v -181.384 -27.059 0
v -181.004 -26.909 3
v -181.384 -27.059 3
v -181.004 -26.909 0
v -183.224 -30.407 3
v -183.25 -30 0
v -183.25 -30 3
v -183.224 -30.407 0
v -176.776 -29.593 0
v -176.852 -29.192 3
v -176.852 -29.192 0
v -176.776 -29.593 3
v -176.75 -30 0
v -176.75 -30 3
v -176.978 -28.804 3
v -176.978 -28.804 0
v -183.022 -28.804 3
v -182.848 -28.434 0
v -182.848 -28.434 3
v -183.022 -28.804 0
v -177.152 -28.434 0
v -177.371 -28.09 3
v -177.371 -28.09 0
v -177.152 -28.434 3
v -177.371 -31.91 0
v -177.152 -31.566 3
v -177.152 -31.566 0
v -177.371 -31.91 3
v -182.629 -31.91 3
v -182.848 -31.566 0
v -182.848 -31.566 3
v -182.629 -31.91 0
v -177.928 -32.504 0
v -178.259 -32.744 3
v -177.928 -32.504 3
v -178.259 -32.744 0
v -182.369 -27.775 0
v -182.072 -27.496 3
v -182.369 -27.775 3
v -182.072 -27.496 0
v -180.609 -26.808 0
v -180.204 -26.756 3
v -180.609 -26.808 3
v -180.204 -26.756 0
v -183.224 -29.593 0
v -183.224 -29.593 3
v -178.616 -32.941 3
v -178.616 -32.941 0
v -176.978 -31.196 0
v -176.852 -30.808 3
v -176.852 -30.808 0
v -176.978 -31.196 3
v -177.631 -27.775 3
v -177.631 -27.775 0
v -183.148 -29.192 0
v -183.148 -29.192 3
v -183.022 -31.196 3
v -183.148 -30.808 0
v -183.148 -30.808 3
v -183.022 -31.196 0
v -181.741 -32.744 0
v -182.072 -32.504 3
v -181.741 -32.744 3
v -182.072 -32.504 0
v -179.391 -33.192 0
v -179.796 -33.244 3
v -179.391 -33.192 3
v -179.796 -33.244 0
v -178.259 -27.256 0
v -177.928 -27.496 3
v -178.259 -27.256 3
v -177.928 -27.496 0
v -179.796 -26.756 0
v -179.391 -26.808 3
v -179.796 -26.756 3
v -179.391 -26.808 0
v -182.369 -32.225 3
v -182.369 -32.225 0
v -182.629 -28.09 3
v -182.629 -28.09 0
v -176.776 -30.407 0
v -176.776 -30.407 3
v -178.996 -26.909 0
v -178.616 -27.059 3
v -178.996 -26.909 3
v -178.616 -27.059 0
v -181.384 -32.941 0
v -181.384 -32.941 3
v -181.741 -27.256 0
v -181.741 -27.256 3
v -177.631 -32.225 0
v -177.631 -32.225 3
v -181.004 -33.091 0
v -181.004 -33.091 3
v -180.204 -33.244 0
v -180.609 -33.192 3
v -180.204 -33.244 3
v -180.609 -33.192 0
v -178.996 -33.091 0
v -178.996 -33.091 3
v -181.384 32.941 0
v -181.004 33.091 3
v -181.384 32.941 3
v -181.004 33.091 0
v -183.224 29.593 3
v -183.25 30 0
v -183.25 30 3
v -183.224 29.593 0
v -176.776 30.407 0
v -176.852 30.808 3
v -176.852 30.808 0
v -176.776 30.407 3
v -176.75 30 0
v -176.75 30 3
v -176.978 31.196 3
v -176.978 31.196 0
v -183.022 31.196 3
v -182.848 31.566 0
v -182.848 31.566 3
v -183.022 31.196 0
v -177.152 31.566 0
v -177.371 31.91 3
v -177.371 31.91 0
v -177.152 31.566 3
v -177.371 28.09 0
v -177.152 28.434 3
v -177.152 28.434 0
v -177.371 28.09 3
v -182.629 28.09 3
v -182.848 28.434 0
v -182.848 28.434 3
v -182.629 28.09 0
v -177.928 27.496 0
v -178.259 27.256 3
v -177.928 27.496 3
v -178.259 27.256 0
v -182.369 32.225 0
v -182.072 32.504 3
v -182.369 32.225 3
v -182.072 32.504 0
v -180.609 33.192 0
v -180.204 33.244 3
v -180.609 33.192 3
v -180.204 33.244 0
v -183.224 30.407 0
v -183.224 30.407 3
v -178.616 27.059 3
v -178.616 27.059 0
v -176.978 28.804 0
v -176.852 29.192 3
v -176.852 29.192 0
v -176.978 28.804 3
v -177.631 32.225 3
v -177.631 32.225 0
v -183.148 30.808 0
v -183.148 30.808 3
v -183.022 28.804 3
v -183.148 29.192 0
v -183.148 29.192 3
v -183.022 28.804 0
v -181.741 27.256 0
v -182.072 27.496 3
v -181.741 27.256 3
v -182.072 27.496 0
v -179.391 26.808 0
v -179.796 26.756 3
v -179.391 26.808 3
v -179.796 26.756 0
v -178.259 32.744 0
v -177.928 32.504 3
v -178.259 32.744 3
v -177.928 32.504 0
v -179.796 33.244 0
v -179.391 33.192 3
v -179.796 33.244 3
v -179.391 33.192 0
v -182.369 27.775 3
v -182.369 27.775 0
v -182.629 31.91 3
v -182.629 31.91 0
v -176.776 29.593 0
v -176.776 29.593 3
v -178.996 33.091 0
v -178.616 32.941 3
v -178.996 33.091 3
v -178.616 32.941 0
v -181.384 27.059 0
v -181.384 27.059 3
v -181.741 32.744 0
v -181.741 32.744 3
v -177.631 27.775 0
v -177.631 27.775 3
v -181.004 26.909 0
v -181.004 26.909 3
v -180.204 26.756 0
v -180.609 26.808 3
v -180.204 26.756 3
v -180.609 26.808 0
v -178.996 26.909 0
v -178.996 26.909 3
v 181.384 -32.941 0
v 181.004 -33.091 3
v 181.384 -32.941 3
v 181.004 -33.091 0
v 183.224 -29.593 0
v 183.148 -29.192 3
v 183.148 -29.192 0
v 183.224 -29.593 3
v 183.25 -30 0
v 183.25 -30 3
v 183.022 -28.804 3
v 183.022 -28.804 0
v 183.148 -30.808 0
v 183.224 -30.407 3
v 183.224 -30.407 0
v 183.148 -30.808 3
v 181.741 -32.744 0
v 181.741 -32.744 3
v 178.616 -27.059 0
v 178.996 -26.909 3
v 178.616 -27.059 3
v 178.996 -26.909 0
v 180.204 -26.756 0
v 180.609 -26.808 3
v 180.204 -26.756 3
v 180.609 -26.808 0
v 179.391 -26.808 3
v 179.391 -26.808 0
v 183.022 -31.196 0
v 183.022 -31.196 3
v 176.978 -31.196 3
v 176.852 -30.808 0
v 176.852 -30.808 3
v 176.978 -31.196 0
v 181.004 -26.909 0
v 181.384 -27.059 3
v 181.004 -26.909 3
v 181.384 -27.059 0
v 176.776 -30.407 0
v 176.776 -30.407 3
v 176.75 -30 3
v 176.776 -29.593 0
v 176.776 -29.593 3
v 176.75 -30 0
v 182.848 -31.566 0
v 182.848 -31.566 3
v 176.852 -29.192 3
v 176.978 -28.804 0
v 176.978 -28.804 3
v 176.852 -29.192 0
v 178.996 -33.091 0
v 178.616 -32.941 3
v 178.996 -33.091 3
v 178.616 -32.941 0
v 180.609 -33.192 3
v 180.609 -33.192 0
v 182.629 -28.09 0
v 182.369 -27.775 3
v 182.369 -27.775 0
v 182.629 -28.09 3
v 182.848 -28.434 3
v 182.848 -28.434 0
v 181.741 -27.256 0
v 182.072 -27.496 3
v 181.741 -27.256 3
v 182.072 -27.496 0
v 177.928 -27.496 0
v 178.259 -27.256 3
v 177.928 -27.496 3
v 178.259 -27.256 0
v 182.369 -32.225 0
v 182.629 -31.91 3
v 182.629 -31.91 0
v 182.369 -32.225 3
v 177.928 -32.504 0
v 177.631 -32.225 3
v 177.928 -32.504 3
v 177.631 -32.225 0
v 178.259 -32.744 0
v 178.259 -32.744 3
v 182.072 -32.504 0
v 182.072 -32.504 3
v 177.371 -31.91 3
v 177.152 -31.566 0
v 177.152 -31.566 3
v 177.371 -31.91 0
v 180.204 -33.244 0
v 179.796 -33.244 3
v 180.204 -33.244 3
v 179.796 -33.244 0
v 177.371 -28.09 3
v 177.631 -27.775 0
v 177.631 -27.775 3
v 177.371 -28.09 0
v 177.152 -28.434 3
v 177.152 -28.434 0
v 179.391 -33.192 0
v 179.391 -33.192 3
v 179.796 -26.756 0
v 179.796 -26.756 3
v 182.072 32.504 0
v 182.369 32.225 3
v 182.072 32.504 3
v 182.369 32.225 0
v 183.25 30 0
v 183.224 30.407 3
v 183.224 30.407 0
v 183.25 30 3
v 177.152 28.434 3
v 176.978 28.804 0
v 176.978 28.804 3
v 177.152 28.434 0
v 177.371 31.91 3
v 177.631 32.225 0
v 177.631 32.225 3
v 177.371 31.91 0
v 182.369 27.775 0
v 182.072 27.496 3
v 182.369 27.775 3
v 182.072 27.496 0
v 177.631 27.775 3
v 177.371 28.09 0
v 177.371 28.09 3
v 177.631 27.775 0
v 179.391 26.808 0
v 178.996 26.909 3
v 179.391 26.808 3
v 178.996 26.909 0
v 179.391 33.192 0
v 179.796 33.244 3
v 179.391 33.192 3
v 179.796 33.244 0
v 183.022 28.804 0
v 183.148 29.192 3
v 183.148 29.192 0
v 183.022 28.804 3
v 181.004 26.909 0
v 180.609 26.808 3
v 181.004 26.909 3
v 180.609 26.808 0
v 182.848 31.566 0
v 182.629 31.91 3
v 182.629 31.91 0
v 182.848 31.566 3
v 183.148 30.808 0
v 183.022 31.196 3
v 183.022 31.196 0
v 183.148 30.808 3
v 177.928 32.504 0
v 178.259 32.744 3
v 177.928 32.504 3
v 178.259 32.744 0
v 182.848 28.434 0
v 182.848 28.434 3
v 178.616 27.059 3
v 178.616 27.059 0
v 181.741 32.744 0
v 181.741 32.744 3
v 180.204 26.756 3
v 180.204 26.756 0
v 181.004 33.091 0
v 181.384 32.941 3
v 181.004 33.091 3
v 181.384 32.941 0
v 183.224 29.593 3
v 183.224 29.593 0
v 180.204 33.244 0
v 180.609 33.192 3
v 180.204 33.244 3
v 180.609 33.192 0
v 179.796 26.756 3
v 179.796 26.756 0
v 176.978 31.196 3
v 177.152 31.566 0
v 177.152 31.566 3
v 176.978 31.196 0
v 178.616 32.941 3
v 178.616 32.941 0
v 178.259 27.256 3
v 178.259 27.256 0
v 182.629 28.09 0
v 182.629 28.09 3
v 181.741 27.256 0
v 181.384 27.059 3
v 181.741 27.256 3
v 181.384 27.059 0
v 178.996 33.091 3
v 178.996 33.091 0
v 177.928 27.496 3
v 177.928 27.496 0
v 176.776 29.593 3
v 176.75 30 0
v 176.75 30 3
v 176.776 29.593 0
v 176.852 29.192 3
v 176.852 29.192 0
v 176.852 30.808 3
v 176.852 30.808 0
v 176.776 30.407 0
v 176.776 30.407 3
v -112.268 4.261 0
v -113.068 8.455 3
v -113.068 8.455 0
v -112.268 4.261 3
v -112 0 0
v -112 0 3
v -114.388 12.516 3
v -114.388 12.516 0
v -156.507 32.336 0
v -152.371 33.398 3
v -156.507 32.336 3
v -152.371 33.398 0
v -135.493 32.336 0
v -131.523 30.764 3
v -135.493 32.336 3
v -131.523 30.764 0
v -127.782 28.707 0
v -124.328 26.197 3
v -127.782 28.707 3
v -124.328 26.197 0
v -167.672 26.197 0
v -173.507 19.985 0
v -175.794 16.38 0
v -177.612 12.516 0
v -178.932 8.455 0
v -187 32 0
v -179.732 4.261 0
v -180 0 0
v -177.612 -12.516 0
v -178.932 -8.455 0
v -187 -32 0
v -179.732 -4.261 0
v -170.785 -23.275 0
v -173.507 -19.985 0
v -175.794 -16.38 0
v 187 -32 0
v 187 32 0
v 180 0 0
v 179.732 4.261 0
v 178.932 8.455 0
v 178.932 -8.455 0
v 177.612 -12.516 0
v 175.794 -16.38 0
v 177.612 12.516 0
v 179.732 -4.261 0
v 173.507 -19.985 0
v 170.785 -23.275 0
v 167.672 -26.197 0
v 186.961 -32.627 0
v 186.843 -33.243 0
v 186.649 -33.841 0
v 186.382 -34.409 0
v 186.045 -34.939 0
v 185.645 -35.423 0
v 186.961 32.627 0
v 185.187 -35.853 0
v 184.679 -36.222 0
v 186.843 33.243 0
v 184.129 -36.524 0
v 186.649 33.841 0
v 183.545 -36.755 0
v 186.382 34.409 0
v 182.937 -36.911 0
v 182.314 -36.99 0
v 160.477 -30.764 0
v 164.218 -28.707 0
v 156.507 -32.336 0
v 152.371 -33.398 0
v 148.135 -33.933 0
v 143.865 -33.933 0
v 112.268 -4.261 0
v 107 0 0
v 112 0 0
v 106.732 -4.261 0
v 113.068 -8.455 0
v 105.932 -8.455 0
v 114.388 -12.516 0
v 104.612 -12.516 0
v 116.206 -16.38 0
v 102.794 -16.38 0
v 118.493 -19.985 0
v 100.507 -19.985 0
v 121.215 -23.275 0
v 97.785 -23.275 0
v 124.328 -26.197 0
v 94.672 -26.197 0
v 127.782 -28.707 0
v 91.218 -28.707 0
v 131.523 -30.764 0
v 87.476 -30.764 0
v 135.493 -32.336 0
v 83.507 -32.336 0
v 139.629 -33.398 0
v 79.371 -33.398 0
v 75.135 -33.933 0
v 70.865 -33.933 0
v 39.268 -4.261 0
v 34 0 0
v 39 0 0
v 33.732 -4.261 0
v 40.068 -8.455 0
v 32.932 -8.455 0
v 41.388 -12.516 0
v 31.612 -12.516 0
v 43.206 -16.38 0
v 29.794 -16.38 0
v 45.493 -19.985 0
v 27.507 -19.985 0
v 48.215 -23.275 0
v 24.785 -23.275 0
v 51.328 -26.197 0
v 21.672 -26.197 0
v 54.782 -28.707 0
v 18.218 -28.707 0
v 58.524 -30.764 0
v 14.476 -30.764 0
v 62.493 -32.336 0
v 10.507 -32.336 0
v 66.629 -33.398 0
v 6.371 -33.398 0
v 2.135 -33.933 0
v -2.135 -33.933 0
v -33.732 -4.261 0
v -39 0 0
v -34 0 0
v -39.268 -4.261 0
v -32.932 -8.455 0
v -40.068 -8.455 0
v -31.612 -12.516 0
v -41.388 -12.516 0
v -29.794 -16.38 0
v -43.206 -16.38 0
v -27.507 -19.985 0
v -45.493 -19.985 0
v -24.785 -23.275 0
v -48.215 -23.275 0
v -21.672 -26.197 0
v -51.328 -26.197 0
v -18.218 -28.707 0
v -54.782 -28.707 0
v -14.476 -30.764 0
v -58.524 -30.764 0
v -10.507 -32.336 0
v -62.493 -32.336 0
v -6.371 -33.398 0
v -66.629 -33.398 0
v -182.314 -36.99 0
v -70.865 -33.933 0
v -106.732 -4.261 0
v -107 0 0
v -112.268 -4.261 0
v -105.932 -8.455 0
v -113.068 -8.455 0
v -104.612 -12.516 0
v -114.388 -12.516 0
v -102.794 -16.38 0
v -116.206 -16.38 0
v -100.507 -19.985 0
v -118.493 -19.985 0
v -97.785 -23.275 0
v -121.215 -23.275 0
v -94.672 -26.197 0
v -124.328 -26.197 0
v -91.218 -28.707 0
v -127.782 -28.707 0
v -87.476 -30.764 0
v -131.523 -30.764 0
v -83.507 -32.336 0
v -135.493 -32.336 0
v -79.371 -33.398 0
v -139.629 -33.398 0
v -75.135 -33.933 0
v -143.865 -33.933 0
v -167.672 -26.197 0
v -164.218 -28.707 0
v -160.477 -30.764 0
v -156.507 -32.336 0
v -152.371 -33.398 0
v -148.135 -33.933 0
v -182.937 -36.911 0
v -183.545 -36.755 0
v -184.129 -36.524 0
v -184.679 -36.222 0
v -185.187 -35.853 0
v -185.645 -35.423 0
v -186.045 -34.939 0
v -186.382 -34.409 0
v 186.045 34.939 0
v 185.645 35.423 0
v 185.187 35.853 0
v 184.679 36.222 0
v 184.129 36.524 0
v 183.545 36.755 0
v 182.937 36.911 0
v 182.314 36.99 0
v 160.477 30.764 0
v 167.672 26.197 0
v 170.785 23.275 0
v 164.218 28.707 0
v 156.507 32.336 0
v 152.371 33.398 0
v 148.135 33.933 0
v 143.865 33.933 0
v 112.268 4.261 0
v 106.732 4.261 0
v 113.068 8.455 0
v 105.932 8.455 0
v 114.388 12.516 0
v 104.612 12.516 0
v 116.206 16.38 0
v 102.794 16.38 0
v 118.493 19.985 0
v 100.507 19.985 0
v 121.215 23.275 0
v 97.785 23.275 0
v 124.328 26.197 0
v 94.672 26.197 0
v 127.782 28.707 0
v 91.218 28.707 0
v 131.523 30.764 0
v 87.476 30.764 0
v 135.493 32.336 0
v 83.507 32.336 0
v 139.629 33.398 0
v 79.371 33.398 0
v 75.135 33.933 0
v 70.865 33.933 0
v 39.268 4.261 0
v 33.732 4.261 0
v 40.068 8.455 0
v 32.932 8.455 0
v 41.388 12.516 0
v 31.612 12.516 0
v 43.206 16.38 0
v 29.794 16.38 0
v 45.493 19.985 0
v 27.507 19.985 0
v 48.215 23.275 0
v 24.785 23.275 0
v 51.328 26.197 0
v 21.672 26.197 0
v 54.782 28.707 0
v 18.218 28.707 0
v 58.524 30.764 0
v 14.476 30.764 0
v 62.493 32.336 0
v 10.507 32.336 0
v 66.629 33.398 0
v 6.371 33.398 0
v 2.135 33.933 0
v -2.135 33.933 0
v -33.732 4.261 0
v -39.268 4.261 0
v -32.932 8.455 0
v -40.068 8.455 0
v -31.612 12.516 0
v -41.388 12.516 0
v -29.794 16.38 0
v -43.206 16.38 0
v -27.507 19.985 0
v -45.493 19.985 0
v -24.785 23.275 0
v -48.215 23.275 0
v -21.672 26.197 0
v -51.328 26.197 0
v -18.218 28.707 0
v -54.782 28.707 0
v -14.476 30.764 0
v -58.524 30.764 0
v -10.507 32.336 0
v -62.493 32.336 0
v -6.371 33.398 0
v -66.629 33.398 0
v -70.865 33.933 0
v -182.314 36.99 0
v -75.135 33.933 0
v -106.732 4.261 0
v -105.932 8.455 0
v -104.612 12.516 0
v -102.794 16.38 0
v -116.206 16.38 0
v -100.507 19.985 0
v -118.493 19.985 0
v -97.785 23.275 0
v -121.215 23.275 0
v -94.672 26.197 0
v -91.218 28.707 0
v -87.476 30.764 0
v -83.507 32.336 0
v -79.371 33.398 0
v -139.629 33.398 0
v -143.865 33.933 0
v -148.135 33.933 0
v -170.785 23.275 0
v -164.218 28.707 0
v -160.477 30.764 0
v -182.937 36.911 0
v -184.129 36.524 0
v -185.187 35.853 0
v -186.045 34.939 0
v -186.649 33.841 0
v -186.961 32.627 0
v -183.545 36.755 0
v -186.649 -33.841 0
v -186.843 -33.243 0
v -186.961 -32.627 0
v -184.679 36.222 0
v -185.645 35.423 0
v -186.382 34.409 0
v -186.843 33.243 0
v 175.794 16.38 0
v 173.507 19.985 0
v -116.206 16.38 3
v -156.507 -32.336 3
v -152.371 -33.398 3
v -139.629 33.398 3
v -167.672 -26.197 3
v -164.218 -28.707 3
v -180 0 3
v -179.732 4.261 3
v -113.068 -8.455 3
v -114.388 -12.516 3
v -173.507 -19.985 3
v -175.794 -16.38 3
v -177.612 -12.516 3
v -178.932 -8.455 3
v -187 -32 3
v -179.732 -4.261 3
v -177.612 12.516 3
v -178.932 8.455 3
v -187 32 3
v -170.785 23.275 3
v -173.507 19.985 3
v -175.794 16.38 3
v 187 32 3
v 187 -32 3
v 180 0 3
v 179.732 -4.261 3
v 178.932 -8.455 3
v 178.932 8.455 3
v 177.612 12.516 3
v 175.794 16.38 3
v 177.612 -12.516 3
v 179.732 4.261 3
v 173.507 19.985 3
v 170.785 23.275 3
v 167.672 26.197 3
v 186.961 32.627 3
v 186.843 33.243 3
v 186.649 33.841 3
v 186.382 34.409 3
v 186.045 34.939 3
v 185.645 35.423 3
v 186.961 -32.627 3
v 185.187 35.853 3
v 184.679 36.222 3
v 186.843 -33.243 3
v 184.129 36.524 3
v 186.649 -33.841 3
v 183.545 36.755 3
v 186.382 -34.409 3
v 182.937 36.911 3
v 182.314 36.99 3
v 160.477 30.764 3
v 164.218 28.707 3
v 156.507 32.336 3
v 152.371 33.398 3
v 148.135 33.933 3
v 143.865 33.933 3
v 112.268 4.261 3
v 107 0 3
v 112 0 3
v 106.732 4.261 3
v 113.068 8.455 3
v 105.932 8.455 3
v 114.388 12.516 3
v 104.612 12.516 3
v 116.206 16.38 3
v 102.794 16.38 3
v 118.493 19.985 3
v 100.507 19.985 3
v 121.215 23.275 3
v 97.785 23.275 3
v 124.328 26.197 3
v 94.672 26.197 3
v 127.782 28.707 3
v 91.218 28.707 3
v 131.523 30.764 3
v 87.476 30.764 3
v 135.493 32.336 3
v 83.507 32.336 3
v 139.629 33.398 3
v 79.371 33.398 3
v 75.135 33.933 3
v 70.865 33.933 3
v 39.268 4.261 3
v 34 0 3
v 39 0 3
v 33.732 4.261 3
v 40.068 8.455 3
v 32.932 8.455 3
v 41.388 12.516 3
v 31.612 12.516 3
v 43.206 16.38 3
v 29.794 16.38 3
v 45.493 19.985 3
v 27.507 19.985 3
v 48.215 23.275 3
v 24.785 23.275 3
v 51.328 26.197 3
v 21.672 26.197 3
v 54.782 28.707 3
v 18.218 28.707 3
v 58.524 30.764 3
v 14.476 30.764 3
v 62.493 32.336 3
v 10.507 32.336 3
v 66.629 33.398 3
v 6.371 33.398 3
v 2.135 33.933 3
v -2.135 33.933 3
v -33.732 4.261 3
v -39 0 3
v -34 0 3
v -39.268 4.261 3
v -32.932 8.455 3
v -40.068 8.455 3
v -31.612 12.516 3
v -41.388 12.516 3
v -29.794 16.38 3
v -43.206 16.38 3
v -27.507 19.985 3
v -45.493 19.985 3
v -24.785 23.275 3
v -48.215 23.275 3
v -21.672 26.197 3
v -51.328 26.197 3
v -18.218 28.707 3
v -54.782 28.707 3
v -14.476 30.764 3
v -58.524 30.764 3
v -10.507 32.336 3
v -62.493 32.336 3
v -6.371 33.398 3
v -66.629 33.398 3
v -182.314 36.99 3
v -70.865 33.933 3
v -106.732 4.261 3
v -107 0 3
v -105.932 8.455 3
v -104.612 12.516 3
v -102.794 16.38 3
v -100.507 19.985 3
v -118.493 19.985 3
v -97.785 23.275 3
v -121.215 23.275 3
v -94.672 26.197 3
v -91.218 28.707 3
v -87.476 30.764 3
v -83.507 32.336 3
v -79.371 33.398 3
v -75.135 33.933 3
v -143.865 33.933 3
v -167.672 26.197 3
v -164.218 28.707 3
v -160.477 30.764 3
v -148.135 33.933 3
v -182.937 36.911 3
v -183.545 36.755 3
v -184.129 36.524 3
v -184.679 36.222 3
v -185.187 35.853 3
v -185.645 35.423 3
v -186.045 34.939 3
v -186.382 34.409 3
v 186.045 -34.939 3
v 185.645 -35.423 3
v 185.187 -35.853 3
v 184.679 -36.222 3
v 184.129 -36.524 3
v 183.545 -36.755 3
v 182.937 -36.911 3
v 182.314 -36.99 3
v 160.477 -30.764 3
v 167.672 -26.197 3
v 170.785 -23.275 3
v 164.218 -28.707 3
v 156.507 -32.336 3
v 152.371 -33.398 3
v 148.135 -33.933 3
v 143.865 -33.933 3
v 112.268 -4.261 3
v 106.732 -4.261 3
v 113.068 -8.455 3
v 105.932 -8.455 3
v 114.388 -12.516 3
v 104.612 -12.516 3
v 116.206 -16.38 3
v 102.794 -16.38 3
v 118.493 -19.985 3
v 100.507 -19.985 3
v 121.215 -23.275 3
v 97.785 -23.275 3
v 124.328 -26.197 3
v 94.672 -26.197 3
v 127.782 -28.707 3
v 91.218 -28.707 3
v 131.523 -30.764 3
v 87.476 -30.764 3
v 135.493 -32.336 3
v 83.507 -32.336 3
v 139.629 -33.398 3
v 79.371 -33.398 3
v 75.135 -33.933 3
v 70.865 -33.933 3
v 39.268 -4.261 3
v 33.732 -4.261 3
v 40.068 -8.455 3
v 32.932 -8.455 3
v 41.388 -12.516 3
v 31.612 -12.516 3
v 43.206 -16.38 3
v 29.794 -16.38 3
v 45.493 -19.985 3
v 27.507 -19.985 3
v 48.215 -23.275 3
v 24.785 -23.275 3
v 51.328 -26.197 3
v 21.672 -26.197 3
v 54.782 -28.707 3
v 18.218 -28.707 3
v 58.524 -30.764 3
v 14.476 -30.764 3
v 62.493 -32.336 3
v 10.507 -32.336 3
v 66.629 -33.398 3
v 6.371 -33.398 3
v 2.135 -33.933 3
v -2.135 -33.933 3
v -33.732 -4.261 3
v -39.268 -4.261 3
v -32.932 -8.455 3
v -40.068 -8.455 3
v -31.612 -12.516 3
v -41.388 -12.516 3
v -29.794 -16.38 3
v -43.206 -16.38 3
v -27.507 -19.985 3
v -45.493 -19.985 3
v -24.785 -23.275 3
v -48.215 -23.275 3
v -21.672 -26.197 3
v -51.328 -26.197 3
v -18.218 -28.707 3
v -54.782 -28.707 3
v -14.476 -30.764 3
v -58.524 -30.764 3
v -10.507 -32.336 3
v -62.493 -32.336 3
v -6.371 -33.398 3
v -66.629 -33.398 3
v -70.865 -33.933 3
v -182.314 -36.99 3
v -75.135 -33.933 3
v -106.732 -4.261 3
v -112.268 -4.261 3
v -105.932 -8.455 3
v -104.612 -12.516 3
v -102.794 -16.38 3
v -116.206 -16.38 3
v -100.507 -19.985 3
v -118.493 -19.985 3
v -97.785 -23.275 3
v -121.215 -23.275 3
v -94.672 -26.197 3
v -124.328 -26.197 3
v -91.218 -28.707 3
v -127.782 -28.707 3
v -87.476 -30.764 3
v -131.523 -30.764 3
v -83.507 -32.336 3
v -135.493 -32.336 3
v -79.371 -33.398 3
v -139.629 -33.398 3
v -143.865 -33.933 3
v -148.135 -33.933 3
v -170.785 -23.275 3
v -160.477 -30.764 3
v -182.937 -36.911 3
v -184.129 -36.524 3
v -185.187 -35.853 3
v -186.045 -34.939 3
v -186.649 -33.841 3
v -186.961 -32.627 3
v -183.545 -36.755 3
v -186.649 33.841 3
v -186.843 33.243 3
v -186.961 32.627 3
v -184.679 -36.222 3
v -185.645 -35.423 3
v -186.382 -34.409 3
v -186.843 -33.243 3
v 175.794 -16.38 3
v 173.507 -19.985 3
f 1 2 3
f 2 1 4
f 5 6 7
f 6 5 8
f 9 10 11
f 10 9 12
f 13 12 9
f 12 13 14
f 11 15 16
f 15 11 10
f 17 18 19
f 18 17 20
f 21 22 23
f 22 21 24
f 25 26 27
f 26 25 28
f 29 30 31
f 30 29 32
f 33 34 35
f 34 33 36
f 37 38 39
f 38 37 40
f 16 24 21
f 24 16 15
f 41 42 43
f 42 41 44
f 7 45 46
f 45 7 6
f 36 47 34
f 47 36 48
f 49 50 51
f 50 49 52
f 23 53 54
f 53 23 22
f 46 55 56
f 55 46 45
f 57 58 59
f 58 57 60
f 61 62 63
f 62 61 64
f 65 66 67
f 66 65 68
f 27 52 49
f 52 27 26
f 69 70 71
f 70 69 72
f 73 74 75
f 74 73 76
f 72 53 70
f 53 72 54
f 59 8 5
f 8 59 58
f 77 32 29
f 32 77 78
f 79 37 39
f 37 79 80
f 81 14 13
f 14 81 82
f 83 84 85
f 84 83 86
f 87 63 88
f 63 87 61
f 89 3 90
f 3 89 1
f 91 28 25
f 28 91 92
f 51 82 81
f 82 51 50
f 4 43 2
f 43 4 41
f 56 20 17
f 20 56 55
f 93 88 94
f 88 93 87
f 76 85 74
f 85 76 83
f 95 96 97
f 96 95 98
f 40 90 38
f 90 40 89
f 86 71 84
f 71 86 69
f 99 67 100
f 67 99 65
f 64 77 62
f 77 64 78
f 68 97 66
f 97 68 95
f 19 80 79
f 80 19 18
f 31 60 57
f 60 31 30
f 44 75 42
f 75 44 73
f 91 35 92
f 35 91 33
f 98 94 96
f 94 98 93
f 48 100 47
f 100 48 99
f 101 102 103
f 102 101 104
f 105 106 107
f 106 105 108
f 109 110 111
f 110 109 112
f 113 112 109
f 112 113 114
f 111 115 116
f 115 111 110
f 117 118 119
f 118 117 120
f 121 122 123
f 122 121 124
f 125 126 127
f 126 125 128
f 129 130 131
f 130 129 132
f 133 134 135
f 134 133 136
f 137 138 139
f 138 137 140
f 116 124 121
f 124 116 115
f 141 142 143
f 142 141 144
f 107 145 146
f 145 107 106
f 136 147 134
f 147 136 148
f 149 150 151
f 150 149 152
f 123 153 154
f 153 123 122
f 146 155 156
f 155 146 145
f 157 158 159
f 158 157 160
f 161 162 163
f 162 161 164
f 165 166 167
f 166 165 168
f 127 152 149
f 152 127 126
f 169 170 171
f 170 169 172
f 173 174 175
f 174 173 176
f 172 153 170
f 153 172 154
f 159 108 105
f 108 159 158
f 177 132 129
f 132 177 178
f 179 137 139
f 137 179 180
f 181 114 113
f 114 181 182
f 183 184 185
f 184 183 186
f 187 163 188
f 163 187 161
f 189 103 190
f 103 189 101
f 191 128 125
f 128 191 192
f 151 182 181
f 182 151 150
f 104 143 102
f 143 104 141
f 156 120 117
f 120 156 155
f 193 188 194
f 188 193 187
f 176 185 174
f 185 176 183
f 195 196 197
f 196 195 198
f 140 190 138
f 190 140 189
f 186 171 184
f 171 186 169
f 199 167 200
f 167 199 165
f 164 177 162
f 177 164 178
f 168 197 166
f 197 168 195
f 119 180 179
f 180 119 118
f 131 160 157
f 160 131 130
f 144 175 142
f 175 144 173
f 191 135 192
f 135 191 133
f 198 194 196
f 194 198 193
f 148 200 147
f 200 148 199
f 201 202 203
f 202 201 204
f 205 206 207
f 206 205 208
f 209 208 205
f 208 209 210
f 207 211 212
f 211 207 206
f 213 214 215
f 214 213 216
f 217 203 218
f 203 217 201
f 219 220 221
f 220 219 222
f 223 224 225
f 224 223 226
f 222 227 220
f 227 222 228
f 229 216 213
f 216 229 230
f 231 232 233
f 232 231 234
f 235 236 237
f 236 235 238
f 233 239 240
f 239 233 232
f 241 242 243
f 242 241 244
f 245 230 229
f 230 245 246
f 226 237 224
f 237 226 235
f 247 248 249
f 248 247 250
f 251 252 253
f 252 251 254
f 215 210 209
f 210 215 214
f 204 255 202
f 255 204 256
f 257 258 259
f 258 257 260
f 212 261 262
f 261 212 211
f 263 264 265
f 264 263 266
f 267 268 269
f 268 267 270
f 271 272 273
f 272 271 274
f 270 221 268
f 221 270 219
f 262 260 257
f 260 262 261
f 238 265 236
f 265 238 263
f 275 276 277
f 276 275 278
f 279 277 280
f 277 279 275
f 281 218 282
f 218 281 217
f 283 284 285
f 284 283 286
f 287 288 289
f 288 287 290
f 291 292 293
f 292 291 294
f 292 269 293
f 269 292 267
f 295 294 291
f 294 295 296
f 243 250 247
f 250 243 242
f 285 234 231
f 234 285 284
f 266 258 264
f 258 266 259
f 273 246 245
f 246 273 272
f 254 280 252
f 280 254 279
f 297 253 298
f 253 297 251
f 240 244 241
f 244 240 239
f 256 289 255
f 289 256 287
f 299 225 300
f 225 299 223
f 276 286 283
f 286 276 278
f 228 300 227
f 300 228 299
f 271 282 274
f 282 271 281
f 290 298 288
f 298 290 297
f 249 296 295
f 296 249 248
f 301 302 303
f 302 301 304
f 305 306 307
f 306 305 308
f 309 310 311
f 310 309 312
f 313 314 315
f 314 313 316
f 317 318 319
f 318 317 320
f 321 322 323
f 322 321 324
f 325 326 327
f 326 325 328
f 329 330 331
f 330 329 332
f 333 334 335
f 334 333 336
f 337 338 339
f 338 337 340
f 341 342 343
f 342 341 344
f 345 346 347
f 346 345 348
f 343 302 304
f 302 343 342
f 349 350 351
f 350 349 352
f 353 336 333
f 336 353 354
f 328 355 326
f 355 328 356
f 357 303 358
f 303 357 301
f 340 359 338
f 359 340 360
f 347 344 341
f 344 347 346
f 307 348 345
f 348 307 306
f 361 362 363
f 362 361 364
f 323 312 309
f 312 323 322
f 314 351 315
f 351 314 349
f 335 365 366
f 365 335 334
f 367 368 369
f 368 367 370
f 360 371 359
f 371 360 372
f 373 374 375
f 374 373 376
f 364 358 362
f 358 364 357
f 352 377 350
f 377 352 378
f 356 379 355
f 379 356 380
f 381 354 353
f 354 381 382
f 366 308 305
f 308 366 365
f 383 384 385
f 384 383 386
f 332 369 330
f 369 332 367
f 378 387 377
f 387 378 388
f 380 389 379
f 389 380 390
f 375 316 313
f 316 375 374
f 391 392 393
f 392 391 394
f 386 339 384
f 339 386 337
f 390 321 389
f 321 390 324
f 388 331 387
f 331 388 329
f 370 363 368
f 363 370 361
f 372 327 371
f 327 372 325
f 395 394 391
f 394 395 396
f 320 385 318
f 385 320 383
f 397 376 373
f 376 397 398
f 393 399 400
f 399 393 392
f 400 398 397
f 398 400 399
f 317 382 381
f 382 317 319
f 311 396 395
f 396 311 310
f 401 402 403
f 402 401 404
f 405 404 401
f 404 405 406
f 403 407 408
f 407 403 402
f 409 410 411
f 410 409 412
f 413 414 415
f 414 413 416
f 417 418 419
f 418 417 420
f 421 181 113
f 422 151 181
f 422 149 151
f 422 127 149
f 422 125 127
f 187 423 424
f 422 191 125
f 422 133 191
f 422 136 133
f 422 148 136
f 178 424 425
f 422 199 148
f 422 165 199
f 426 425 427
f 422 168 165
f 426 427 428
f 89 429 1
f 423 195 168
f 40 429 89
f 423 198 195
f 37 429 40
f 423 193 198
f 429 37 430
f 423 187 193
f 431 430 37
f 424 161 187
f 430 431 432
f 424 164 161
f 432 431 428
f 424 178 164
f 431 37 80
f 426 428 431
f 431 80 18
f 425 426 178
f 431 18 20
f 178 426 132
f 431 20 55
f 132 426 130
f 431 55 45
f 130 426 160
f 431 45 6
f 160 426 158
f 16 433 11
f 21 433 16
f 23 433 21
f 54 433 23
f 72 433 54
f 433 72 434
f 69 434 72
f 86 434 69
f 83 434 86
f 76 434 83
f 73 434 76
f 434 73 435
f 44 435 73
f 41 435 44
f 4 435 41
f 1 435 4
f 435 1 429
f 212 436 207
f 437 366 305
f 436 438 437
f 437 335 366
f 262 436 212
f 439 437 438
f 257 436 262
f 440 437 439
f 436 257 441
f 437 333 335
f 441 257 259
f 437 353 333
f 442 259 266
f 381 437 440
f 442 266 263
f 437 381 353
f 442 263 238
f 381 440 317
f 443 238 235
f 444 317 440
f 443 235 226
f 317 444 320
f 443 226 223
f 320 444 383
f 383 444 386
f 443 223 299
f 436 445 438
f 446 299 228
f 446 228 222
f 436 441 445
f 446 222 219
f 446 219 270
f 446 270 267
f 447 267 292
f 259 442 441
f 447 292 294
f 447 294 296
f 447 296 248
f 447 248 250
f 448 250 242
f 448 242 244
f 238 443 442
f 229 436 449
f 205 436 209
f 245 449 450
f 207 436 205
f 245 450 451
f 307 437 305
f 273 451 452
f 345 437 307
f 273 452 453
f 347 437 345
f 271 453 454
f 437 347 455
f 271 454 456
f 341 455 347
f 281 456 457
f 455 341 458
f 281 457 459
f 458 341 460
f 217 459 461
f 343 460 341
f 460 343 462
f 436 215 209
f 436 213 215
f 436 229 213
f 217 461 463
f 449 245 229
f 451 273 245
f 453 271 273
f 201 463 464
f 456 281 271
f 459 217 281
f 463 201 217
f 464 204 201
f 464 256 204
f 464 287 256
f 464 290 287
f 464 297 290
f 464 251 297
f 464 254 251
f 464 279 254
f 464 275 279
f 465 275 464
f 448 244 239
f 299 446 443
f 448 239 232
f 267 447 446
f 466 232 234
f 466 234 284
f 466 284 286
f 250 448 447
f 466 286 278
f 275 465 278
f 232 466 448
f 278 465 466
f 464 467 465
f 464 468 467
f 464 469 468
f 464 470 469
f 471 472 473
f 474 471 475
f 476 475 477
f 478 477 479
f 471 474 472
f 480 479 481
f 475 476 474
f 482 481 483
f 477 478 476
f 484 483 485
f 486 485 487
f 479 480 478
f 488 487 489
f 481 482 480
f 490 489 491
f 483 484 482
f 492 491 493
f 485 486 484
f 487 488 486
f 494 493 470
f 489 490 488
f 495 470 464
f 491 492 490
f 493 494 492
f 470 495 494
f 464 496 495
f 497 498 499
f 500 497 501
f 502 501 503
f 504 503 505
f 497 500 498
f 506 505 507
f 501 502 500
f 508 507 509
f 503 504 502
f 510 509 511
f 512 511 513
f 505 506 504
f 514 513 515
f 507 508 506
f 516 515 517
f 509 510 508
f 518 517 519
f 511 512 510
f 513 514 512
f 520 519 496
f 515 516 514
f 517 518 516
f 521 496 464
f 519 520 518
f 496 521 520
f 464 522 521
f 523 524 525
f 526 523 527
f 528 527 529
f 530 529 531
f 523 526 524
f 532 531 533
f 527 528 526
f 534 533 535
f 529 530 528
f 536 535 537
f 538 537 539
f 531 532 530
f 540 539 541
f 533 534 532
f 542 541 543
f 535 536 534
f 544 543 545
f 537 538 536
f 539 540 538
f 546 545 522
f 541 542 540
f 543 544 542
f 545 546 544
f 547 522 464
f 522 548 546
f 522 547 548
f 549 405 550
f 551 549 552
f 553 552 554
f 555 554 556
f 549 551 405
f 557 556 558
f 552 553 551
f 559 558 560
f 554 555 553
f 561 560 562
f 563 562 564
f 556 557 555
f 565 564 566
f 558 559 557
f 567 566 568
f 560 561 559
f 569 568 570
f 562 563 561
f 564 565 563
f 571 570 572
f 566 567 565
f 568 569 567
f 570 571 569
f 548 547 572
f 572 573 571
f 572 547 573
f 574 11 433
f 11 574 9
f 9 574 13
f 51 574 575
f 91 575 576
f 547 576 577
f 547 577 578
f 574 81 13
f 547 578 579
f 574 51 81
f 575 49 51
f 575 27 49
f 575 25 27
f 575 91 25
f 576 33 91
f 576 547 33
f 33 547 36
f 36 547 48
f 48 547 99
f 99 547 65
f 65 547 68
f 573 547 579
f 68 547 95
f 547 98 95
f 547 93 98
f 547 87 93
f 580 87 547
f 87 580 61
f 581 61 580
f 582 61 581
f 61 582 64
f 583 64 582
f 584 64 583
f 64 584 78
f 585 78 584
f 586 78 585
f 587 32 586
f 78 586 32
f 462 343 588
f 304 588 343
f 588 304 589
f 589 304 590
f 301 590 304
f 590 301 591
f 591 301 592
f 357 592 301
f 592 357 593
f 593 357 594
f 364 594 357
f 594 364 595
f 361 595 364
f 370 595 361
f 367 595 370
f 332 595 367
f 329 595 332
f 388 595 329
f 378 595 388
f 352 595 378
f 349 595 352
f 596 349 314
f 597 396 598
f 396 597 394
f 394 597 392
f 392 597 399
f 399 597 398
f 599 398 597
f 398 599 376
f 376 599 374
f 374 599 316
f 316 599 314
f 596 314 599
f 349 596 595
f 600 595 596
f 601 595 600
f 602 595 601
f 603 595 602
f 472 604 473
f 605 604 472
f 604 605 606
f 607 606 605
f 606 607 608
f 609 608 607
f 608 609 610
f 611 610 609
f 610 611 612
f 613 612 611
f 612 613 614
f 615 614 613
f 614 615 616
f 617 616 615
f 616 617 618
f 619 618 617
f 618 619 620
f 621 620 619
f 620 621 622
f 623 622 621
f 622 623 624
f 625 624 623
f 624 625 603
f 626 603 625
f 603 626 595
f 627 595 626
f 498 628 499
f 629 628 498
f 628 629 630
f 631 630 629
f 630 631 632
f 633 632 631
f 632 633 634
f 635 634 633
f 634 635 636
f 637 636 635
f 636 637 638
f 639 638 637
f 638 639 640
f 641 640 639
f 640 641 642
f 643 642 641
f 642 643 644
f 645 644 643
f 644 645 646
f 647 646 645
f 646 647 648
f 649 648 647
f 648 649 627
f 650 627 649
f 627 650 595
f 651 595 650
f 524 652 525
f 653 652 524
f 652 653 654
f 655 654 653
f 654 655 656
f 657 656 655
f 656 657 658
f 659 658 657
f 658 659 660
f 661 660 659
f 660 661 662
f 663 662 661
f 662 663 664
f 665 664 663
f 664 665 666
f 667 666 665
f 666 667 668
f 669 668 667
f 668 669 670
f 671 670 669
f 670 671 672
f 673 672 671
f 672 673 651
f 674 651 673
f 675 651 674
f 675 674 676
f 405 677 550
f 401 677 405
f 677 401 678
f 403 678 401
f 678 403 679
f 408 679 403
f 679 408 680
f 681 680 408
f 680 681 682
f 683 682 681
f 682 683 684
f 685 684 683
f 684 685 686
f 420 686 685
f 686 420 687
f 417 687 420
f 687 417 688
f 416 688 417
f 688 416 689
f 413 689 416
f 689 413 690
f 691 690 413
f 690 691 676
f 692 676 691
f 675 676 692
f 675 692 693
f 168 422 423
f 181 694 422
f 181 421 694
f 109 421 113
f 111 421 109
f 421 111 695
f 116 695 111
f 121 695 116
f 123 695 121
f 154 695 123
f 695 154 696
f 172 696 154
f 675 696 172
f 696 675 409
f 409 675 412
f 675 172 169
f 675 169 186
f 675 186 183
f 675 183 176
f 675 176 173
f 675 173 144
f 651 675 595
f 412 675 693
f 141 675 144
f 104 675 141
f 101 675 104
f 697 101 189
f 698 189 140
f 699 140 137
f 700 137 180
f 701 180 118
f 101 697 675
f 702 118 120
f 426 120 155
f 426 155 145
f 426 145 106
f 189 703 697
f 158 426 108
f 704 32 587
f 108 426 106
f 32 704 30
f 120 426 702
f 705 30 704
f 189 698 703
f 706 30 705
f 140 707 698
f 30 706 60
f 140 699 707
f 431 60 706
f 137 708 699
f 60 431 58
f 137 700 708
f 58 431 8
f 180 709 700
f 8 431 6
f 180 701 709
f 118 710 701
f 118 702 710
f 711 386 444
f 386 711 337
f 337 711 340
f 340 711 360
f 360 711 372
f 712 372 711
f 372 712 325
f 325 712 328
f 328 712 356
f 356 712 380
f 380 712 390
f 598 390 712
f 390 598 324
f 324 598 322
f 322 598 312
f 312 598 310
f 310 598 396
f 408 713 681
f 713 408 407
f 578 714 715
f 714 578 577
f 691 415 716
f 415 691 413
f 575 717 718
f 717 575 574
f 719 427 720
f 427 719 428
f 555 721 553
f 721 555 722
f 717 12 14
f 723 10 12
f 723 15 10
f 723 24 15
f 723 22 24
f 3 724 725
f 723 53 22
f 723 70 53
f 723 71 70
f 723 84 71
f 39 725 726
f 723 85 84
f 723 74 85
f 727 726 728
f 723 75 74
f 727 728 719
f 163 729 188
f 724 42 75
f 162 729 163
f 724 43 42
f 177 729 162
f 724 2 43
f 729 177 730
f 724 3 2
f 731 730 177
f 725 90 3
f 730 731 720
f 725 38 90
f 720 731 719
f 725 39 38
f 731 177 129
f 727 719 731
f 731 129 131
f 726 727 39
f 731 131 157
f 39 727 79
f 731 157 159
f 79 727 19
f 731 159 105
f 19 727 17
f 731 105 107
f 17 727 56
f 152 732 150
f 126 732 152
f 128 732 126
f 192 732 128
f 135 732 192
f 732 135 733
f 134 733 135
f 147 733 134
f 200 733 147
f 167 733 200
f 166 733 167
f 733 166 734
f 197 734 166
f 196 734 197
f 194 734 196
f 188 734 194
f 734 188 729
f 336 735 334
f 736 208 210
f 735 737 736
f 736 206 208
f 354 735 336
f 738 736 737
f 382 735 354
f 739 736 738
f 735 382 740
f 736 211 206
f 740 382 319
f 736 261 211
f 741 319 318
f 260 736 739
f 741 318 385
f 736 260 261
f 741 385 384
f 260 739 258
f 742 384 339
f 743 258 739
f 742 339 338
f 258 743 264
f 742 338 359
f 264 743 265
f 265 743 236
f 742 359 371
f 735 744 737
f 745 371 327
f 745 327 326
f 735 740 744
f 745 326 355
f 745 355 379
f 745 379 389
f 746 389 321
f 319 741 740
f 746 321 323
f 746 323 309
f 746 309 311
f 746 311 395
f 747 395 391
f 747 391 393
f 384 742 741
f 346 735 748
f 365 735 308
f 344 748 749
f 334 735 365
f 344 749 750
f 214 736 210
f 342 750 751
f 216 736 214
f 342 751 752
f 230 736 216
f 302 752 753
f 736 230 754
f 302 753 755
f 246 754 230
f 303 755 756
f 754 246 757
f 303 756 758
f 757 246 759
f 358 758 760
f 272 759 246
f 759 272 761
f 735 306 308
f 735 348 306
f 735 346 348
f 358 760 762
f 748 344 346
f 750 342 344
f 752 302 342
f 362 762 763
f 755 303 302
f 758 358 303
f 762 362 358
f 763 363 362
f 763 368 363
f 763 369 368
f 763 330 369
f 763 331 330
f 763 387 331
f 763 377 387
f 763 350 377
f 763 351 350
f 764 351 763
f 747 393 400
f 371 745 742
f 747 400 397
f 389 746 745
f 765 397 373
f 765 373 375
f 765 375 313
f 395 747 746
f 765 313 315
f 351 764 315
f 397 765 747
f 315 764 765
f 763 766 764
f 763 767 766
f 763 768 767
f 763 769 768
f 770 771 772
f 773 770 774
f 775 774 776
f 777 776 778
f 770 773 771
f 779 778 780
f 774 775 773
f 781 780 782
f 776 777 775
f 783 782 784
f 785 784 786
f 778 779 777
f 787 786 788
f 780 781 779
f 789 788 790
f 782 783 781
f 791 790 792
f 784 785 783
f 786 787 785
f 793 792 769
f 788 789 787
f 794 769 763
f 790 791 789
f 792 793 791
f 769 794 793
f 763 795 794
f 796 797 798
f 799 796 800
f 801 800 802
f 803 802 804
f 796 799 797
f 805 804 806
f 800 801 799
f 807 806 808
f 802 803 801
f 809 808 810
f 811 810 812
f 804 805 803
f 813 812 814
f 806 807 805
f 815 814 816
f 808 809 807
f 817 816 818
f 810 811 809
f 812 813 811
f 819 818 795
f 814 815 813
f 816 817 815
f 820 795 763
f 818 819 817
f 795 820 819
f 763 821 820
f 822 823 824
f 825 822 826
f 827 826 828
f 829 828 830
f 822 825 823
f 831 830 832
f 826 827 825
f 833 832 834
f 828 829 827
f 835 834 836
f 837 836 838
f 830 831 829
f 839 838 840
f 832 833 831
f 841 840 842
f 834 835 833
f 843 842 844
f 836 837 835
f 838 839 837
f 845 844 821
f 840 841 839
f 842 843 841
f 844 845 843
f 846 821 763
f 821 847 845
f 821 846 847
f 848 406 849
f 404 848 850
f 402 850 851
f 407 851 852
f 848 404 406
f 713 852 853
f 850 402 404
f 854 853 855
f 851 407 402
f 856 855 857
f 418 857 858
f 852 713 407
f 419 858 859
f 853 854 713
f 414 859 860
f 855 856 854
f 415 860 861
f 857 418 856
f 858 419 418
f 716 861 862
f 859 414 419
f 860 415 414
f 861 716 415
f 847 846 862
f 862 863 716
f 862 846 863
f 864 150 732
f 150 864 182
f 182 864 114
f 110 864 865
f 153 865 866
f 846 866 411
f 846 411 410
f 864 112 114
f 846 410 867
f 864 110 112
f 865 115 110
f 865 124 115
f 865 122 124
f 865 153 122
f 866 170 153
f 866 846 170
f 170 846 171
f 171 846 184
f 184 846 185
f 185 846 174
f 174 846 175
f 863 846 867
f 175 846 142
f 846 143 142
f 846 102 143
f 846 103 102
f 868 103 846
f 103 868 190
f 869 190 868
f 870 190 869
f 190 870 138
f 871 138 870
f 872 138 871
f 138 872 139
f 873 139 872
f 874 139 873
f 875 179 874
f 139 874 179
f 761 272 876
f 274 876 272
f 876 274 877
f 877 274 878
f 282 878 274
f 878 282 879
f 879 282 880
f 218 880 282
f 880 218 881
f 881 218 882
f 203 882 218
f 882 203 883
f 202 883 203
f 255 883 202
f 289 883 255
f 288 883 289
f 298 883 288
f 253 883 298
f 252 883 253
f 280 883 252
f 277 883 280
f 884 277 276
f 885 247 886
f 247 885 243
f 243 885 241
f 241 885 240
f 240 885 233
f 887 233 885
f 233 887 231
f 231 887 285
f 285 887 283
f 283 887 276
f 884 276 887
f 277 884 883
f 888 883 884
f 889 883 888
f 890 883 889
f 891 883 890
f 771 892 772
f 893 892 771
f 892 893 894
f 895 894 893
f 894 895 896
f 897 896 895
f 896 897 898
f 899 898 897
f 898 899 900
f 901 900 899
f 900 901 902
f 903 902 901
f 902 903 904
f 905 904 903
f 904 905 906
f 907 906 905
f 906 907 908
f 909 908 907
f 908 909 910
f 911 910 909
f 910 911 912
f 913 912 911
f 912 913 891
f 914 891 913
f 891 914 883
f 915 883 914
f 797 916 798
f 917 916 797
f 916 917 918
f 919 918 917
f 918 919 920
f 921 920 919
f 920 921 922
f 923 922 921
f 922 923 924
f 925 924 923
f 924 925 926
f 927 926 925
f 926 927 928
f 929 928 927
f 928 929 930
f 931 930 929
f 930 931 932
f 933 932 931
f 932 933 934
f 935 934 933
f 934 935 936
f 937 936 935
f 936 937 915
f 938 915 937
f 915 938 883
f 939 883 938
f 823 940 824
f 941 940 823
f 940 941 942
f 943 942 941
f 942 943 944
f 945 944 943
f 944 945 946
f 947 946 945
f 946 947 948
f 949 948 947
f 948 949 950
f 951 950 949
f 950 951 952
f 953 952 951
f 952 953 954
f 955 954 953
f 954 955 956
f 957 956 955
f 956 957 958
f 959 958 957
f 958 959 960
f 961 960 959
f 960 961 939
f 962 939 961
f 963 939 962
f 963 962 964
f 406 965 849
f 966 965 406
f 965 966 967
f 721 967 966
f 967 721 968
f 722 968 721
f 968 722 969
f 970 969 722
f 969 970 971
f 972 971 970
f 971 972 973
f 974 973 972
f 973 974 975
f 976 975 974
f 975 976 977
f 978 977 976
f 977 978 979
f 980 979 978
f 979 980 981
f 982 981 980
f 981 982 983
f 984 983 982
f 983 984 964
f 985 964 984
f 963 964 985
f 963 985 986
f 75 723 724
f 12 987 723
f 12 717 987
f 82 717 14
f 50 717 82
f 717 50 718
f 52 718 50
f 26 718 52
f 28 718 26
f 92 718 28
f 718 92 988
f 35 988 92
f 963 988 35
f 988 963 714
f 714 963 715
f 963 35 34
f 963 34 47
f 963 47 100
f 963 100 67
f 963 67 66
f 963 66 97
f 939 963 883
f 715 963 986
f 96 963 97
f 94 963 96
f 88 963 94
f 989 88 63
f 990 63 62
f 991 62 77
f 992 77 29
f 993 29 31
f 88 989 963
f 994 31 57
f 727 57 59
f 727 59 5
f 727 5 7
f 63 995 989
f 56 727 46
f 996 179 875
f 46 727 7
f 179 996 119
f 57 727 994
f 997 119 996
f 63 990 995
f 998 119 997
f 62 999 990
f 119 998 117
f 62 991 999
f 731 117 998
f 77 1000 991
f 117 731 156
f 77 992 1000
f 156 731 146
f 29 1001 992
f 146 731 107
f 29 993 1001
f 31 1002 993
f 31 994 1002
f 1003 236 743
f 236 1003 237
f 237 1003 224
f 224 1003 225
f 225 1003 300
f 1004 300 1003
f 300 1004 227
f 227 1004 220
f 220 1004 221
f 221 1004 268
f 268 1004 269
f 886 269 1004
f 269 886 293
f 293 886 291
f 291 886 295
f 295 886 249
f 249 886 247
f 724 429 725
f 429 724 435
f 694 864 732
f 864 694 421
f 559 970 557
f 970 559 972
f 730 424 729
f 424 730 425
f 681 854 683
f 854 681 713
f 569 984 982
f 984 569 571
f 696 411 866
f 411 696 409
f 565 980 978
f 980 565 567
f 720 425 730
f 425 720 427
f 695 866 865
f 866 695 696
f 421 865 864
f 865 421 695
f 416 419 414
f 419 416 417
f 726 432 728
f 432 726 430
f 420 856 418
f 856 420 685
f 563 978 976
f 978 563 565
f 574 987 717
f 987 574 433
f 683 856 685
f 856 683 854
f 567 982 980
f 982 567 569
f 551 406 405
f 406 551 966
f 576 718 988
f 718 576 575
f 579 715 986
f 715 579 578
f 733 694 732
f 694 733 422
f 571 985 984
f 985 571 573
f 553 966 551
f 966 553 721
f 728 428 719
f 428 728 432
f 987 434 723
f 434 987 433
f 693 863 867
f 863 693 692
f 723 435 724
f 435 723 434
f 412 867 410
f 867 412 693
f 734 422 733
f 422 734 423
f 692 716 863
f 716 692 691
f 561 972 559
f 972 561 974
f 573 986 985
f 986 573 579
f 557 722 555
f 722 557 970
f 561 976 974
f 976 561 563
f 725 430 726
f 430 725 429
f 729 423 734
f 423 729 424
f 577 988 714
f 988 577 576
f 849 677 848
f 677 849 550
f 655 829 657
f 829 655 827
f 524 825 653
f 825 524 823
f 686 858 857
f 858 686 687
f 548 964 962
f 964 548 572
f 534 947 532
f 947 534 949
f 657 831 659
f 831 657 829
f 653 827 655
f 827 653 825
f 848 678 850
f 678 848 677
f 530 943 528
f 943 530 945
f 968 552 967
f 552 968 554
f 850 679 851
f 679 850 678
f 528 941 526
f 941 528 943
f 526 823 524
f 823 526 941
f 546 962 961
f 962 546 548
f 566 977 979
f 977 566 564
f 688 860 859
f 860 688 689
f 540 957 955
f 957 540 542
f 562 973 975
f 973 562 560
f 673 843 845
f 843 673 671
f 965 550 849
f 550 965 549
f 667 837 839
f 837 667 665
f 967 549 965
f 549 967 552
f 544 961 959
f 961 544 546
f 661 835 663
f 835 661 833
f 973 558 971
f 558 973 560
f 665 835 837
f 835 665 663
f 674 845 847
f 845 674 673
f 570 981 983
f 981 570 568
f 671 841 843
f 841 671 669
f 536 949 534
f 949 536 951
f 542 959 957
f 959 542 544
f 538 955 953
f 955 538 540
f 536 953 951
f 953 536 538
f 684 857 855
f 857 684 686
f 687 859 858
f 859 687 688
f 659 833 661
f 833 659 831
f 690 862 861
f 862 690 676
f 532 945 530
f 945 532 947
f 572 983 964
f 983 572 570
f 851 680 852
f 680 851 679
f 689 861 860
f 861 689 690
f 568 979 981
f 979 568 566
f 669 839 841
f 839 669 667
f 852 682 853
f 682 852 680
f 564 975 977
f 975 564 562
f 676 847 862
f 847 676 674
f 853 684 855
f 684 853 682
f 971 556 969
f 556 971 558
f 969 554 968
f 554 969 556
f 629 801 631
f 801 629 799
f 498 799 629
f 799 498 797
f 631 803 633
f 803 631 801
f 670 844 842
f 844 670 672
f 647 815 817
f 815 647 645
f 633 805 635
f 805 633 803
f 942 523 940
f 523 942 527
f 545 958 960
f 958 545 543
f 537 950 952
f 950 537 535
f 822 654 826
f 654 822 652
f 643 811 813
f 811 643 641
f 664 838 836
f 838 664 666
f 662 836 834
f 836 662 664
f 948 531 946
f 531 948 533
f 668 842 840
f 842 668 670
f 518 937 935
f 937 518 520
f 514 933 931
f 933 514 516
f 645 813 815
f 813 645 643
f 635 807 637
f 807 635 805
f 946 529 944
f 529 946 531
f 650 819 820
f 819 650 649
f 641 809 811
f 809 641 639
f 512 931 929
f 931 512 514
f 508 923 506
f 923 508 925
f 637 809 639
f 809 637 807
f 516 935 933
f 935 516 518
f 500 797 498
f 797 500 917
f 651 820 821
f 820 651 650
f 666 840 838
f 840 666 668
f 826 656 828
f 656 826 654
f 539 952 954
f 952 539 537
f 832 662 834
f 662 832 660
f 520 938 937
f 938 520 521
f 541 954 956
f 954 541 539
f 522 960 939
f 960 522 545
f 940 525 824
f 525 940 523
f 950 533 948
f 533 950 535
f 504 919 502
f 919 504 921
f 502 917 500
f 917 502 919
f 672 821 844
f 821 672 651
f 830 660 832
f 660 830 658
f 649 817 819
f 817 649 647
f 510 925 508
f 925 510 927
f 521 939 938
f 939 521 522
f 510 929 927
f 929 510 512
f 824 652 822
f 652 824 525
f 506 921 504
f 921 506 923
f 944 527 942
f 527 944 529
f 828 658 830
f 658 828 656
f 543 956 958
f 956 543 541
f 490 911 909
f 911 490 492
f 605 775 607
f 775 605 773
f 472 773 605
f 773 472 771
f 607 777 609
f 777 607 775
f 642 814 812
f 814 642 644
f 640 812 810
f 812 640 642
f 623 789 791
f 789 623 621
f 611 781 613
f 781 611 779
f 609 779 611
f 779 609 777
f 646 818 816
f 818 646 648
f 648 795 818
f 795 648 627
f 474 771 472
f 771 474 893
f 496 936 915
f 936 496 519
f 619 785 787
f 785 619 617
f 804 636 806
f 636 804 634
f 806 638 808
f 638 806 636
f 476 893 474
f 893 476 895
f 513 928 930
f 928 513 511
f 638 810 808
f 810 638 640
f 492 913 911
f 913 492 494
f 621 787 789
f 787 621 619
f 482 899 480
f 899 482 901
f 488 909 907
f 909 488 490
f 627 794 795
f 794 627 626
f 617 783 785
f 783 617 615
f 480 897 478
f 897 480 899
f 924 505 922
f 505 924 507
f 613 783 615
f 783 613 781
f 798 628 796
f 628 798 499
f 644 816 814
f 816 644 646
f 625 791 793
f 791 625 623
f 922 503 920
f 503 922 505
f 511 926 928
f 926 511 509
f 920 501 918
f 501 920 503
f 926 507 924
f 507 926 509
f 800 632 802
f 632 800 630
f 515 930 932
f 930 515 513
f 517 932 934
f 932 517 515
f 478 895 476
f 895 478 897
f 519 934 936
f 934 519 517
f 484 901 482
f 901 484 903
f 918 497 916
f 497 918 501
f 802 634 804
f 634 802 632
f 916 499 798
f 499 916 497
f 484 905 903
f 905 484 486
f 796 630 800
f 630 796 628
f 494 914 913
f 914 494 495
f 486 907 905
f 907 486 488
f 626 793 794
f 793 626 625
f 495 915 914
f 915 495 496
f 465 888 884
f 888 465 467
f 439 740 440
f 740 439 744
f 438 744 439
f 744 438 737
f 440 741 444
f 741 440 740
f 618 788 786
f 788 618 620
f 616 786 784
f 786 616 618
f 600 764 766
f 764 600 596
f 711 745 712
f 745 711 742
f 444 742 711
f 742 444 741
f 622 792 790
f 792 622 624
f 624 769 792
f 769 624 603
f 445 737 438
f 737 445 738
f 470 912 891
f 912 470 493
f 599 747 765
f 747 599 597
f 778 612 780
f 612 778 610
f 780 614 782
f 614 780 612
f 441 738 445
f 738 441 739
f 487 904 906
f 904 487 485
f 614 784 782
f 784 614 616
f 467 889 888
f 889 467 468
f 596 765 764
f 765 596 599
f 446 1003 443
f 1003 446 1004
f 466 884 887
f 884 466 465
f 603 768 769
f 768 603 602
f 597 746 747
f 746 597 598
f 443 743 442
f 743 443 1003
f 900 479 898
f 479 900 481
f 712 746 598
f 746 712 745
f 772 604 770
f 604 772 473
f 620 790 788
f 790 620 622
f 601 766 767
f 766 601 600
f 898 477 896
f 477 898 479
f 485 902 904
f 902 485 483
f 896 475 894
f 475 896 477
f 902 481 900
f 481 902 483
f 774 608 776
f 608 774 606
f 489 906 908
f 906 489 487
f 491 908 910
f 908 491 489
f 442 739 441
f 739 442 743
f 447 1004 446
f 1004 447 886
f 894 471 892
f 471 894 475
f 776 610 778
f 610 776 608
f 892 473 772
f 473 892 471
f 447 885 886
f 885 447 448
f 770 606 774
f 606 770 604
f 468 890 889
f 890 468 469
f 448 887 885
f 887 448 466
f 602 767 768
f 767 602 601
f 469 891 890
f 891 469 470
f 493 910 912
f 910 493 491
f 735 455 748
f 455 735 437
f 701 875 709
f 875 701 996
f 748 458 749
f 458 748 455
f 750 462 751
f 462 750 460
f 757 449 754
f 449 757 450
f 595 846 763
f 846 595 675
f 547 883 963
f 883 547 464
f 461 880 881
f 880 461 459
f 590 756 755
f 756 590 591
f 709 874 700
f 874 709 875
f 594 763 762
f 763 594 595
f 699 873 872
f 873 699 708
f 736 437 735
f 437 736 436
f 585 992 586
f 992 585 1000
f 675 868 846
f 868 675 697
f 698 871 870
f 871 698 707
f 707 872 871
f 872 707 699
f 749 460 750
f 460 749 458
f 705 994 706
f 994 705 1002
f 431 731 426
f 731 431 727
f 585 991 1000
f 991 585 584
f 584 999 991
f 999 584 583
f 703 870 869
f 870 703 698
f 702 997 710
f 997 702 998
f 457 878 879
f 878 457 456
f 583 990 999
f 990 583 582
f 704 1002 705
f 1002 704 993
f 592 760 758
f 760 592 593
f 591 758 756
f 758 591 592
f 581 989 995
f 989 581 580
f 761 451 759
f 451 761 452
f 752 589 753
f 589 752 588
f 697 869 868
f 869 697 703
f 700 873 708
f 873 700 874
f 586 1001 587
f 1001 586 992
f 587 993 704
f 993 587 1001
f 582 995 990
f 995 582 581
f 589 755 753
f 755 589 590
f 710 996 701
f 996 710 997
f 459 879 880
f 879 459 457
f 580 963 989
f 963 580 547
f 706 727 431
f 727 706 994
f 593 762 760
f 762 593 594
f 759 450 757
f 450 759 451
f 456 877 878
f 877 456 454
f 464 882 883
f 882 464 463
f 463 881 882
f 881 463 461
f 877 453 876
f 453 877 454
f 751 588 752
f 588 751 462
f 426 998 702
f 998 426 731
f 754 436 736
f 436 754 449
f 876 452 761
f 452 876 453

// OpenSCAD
$fn = 50;


difference() {
	union() {
		hull() {
			translate(v = [-182.0000000000, 32.0000000000, 0]) {
				cylinder(h = 3, r = 5);
			}
			translate(v = [182.0000000000, 32.0000000000, 0]) {
				cylinder(h = 3, r = 5);
			}
			translate(v = [-182.0000000000, -32.0000000000, 0]) {
				cylinder(h = 3, r = 5);
			}
			translate(v = [182.0000000000, -32.0000000000, 0]) {
				cylinder(h = 3, r = 5);
			}
		}
	}
	union() {
		#translate(v = [-180.0000000000, -30.0000000000, -100.0000000000]) {
			cylinder(h = 200, r = 3.2500000000);
		}
		#translate(v = [-180.0000000000, 30.0000000000, -100.0000000000]) {
			cylinder(h = 200, r = 3.2500000000);
		}
		#translate(v = [180.0000000000, -30.0000000000, -100.0000000000]) {
			cylinder(h = 200, r = 3.2500000000);
		}
		#translate(v = [180.0000000000, 30.0000000000, -100.0000000000]) {
			cylinder(h = 200, r = 3.2500000000);
		}
		#translate(v = [-146.0000000000, 0, 0]) {
			cylinder(h = 3, r = 34.0000000000);
		}
		#translate(v = [-73.0000000000, 0, 0]) {
			cylinder(h = 3, r = 34.0000000000);
		}
		#cylinder(h = 3, r = 34.0000000000);
		#translate(v = [73.0000000000, 0, 0]) {
			cylinder(h = 3, r = 34.0000000000);
		}
		#translate(v = [146.0000000000, 0, 0]) {
			cylinder(h = 3, r = 34.0000000000);
		}
	}
}
